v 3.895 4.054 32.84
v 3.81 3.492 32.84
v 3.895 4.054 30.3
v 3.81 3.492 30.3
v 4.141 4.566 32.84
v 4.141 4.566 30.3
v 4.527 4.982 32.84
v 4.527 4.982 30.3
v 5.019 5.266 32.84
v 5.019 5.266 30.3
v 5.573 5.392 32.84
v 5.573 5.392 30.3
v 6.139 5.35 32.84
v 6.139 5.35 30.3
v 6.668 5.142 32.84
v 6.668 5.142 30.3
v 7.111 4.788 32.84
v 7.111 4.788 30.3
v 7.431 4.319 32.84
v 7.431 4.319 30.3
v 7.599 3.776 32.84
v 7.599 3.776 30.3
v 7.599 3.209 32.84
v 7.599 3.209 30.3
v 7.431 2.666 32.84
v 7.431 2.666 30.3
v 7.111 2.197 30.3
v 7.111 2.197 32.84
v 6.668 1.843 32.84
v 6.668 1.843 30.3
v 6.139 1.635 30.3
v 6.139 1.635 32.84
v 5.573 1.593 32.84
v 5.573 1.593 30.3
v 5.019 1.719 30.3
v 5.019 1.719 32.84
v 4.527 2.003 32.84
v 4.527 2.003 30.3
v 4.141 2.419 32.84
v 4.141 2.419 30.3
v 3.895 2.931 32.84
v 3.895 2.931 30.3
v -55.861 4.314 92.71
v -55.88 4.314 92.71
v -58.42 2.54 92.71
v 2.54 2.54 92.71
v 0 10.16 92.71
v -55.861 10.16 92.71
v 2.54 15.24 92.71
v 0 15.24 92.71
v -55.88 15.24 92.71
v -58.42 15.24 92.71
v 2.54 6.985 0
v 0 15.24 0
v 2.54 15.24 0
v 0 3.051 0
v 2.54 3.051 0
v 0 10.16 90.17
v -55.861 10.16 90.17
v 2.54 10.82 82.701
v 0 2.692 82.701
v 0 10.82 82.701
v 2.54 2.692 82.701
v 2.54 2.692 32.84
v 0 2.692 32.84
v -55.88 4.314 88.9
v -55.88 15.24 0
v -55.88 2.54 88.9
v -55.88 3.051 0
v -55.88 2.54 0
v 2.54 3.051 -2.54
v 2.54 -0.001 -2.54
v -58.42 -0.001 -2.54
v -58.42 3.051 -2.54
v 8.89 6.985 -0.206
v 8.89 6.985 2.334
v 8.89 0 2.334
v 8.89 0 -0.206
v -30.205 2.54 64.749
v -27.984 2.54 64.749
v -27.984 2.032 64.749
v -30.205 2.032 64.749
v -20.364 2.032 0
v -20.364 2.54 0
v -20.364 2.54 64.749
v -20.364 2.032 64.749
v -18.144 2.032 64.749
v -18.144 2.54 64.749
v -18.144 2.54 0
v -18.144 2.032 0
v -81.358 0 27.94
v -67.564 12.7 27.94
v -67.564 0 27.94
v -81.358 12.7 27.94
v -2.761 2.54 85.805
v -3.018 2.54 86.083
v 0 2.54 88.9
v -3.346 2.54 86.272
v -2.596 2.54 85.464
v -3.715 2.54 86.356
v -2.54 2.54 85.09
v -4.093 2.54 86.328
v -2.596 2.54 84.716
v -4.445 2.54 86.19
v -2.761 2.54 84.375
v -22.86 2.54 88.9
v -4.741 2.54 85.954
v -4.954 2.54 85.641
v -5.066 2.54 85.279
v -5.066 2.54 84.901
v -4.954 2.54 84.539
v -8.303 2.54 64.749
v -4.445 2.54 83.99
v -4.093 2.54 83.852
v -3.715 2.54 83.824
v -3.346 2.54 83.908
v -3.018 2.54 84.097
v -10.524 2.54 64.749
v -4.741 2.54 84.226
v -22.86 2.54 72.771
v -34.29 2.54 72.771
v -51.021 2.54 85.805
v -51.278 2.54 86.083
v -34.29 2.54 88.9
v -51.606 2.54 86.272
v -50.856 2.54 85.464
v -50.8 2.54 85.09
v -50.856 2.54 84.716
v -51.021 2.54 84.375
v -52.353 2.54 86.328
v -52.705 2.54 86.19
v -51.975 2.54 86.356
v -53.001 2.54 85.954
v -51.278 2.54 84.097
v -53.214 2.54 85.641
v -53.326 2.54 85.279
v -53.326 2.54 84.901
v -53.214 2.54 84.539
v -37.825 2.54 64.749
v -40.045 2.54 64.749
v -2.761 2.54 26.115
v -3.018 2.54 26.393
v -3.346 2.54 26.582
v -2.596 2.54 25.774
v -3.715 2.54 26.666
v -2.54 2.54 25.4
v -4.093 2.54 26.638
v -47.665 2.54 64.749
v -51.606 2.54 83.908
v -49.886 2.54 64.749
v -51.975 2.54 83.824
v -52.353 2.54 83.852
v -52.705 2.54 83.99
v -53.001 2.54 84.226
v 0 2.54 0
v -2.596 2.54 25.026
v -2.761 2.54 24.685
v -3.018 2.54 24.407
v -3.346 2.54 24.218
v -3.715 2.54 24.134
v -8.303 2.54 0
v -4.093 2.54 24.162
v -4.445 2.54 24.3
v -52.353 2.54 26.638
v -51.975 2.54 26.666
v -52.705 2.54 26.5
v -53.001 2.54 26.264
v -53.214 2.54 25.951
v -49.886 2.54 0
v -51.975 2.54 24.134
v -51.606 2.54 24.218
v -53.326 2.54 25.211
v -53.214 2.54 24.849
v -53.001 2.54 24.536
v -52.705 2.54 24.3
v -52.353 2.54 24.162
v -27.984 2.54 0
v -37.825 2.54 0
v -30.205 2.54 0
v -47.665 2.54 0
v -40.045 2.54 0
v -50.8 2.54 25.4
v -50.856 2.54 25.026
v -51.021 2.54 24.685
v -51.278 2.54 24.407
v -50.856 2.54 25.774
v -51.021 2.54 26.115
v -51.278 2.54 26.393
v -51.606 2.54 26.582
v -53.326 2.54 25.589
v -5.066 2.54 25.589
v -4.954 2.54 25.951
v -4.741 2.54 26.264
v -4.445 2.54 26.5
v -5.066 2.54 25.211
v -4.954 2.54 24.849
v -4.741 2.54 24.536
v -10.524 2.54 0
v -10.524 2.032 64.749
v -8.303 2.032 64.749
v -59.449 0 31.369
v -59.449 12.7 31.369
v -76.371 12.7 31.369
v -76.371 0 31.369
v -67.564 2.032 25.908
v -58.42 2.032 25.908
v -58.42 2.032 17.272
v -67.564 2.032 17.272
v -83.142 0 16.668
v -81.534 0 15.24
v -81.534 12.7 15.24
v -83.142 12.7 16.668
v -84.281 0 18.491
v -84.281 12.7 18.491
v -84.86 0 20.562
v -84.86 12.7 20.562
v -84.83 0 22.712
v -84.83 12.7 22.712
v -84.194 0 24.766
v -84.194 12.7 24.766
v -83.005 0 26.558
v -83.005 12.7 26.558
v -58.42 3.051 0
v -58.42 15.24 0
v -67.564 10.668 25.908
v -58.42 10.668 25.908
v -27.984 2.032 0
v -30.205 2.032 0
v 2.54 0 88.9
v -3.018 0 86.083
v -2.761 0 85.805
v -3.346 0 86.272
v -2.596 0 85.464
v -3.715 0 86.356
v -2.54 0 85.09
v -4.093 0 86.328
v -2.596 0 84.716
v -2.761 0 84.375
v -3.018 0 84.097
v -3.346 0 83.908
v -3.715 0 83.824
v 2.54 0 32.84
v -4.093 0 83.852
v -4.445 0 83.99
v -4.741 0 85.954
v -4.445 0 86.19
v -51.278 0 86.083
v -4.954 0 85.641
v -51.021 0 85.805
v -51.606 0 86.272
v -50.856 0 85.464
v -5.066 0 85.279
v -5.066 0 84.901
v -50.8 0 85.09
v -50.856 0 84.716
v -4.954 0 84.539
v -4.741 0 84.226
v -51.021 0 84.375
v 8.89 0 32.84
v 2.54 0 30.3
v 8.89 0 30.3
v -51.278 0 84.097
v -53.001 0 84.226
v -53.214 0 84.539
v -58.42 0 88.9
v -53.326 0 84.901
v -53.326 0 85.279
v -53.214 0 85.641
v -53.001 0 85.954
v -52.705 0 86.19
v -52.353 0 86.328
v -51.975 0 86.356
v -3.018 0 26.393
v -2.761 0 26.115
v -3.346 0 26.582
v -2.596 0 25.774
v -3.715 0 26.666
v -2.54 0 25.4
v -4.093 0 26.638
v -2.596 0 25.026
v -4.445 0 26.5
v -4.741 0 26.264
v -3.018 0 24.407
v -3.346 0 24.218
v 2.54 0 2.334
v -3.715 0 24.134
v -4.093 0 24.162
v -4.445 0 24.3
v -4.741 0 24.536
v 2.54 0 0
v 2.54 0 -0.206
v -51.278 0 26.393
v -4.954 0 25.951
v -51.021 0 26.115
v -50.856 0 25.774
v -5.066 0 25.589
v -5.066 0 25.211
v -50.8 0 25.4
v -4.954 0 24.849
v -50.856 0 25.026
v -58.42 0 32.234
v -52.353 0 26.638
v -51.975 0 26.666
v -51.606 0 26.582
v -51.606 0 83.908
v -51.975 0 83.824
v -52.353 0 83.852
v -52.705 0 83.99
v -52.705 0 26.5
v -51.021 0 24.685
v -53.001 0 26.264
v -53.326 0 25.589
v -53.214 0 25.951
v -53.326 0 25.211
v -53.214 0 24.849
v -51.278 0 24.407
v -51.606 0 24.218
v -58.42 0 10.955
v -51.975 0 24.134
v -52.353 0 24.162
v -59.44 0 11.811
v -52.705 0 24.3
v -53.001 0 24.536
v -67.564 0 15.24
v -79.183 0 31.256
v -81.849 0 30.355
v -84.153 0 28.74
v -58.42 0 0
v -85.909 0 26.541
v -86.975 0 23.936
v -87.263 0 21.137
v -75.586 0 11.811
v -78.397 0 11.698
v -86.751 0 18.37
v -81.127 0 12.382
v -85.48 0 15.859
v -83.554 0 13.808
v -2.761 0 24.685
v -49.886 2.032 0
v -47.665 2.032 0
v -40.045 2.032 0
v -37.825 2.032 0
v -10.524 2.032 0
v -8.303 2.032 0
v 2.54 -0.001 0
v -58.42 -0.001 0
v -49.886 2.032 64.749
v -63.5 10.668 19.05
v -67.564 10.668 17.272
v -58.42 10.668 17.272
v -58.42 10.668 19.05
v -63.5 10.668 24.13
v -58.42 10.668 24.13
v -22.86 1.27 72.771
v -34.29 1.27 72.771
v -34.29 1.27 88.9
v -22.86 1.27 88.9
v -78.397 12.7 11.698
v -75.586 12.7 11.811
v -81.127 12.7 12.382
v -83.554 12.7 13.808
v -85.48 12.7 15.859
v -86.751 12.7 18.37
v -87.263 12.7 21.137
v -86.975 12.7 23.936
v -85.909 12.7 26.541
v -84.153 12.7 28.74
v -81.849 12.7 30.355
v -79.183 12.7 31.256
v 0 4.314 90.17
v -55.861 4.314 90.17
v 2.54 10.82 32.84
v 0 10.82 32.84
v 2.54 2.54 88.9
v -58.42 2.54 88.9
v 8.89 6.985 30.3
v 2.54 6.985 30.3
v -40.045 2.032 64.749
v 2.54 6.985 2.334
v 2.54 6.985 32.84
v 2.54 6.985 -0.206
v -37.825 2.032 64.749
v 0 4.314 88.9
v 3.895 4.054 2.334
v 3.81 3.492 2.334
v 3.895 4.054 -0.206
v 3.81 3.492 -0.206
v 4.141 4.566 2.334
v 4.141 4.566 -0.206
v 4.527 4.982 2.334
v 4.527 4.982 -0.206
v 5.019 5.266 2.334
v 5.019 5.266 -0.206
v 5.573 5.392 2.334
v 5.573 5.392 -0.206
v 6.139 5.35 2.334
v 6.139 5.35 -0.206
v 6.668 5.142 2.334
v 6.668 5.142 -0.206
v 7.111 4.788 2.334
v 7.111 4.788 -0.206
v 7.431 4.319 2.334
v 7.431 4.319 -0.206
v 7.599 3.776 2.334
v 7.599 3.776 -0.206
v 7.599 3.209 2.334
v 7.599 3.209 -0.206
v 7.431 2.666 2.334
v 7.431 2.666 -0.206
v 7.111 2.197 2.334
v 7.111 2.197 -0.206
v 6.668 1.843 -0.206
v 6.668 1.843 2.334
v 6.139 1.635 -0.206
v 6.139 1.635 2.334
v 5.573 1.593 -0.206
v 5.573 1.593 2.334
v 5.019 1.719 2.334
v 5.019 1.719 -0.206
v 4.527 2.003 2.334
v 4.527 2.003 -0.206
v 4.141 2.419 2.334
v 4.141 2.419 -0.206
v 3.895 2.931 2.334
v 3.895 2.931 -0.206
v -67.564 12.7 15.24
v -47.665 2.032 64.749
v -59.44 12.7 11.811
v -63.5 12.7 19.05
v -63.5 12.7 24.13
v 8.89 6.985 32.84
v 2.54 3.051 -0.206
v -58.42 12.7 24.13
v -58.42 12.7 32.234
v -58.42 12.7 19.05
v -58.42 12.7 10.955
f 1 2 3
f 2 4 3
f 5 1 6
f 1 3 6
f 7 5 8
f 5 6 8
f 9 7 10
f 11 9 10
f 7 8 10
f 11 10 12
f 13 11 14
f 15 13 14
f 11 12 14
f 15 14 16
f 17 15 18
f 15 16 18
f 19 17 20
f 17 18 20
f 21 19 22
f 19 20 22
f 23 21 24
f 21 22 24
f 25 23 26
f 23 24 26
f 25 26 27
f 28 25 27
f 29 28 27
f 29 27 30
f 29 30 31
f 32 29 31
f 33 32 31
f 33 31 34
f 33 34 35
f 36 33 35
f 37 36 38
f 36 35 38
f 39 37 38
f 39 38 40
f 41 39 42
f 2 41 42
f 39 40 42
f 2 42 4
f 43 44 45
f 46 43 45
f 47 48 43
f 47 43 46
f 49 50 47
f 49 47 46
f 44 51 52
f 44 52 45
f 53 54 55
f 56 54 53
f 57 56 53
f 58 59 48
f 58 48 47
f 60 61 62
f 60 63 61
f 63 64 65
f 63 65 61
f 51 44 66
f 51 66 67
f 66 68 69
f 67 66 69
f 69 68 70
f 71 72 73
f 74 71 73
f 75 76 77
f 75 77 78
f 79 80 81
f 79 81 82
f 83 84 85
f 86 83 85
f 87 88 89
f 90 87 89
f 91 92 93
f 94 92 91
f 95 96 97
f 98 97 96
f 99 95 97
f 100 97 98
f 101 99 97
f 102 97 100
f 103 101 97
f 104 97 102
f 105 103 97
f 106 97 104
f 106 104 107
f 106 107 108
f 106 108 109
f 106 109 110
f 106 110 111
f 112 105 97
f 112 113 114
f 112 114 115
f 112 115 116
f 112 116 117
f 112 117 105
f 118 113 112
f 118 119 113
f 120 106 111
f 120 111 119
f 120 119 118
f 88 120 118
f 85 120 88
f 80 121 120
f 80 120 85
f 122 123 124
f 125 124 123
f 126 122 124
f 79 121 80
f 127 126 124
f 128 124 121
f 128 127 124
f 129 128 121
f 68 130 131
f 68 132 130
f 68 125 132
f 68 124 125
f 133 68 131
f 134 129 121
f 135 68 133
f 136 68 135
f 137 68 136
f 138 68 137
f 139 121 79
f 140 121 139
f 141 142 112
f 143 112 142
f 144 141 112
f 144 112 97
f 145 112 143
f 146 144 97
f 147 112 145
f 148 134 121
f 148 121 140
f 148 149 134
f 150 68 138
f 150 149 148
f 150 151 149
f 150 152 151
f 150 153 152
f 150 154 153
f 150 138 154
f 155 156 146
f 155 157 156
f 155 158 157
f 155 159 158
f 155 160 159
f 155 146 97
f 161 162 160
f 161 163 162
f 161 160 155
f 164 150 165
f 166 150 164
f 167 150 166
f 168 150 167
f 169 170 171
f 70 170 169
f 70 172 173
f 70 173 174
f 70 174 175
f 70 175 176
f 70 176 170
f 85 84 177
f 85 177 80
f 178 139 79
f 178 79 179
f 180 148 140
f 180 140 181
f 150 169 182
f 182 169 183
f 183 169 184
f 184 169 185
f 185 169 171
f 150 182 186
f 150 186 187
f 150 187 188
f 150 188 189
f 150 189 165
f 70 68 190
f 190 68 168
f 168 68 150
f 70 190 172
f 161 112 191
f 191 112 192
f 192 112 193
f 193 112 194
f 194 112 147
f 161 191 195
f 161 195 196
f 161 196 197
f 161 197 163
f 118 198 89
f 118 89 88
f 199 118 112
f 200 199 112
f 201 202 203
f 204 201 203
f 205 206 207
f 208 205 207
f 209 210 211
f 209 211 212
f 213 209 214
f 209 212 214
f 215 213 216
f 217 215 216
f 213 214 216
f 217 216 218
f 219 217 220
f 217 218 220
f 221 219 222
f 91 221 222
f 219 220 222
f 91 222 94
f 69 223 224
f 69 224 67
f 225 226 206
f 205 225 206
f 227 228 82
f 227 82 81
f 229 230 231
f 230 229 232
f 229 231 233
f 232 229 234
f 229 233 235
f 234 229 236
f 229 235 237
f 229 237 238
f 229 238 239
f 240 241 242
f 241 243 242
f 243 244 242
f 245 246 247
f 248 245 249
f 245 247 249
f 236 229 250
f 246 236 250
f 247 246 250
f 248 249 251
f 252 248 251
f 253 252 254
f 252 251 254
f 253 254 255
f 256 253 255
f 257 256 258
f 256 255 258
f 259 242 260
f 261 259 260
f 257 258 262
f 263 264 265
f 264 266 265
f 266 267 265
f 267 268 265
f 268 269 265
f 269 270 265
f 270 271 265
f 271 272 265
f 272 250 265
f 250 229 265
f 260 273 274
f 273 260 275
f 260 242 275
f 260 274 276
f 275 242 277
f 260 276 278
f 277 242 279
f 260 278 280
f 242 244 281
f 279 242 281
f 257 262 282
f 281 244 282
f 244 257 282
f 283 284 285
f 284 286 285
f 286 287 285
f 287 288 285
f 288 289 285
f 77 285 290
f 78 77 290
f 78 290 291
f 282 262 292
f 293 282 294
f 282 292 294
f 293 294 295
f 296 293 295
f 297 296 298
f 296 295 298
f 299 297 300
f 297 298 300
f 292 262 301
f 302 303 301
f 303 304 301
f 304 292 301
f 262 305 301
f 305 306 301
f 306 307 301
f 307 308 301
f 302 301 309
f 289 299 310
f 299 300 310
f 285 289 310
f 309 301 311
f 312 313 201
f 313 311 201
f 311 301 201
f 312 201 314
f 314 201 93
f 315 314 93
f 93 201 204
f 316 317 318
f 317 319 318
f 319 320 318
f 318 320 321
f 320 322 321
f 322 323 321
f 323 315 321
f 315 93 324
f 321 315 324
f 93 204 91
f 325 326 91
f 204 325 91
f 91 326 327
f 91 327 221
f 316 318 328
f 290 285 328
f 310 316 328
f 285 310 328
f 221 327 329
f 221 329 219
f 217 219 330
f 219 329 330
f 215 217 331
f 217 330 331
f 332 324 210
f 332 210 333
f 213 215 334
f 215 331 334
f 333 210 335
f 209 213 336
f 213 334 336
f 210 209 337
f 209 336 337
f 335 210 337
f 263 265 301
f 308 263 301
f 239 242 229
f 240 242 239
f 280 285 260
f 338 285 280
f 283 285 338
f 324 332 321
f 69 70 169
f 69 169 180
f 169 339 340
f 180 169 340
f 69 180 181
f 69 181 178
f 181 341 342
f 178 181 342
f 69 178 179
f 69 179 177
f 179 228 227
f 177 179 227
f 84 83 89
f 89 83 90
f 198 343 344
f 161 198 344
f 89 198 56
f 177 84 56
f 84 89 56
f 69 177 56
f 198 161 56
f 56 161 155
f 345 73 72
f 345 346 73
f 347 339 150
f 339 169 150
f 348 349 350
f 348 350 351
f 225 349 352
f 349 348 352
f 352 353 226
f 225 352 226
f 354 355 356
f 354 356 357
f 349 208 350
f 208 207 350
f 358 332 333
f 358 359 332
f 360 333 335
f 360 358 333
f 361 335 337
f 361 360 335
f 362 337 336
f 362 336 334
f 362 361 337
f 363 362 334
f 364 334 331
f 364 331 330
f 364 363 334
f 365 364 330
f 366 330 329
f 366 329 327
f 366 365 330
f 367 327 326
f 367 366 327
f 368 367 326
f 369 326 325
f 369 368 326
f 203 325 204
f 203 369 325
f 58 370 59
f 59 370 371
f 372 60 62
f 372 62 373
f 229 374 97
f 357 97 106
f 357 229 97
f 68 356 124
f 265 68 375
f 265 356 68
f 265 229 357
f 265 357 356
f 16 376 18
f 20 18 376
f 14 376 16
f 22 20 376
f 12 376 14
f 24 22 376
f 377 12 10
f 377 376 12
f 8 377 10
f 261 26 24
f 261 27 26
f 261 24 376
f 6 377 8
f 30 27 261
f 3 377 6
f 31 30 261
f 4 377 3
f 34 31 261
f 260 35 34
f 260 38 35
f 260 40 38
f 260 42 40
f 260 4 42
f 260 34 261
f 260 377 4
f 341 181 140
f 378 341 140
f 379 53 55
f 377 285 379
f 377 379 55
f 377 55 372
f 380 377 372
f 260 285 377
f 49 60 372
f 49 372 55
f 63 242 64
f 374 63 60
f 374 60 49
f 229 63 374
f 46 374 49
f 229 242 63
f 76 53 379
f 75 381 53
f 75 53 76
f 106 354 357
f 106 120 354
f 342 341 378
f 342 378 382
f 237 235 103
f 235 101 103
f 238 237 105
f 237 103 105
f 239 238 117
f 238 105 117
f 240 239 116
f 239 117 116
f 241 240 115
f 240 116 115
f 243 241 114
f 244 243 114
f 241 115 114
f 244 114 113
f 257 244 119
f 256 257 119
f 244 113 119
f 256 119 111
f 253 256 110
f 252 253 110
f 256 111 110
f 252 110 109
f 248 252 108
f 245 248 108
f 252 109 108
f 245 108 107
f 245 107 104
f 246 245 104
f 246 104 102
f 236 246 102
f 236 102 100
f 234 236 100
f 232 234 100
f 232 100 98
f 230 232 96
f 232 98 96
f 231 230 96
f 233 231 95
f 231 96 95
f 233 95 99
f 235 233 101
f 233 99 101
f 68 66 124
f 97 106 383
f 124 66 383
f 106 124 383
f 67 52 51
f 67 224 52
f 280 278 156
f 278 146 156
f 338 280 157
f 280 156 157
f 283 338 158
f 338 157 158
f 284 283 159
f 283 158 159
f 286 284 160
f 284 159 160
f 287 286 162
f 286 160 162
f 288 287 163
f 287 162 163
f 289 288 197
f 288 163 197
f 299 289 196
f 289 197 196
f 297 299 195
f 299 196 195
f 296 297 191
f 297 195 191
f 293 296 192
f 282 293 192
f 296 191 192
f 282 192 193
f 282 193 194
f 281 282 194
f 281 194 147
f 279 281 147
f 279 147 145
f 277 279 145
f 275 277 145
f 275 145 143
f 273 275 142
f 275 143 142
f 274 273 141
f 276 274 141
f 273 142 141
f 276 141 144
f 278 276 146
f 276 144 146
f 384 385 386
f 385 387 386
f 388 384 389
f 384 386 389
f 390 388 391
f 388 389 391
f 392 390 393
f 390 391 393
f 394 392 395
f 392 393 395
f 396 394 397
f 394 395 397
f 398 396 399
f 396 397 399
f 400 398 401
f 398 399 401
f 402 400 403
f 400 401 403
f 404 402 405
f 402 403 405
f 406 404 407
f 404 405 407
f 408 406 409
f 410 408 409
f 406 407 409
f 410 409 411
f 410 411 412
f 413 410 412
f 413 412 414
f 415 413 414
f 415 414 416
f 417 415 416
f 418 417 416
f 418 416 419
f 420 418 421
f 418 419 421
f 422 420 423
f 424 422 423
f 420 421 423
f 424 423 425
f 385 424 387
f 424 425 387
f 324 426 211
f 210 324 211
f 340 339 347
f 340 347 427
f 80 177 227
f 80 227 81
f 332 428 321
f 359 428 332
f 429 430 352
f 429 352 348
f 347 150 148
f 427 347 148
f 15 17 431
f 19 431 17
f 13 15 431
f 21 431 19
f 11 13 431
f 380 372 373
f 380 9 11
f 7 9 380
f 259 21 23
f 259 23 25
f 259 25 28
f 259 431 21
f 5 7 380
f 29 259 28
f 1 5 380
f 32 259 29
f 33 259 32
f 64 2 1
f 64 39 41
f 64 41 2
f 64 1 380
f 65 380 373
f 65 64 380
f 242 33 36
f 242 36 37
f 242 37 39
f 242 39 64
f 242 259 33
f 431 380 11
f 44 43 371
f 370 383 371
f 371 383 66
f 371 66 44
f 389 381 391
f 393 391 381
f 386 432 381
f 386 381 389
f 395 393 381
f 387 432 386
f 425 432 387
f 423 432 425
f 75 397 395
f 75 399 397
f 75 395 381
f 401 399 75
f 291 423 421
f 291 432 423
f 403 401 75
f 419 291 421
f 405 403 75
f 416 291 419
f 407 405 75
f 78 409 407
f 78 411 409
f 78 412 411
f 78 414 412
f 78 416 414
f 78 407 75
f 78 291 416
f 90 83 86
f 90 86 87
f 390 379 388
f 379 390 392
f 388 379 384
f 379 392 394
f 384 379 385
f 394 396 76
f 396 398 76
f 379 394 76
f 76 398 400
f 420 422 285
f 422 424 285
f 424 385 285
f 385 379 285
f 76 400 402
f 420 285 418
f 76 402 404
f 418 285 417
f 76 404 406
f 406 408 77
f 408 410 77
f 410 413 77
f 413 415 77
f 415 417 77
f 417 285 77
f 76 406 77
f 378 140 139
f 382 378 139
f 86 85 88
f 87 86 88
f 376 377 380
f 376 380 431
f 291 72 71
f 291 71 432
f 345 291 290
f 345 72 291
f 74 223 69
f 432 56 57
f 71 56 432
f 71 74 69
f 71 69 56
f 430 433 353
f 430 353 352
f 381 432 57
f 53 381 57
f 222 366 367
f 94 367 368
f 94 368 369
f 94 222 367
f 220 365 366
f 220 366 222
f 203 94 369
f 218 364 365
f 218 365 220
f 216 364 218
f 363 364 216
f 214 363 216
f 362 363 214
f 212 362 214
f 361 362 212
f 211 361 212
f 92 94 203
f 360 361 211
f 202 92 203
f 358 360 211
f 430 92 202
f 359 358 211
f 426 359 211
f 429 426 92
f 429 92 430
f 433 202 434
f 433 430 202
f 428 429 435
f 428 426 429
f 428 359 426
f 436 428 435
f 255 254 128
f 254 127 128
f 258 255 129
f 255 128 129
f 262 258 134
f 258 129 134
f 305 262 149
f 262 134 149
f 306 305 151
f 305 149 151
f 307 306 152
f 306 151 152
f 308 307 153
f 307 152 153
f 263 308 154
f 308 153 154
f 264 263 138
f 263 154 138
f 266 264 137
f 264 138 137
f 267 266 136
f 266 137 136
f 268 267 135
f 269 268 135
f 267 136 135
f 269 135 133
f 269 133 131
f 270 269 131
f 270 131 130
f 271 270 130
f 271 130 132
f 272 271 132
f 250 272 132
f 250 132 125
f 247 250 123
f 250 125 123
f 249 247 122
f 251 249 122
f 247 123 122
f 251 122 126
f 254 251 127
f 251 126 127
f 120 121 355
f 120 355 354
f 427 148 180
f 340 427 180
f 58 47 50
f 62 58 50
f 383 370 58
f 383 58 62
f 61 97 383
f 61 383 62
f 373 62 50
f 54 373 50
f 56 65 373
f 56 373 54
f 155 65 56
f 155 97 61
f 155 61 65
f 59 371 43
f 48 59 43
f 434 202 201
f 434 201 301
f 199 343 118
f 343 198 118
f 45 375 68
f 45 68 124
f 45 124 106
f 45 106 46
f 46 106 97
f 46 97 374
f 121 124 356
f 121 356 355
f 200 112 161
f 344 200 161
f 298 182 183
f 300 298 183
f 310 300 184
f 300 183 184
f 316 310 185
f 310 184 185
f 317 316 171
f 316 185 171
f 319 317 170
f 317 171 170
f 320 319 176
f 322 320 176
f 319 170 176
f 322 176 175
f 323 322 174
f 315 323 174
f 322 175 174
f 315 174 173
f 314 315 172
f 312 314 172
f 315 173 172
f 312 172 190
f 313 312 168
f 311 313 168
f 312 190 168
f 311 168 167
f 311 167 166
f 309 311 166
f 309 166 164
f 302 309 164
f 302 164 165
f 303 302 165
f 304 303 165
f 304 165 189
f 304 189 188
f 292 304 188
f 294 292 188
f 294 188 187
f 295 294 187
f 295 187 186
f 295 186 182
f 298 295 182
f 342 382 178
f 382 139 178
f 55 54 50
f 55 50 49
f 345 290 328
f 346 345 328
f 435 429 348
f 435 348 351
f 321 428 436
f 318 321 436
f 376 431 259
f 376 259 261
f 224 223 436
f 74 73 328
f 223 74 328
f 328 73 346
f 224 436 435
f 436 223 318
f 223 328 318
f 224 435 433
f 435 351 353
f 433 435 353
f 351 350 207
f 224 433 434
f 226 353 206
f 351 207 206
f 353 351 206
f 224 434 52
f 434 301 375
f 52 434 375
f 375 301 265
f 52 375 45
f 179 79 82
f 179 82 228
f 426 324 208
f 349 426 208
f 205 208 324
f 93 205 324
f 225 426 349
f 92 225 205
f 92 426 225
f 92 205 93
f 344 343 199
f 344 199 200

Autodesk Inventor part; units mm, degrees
ref_plane "YZ Plane" through (0, 0, 0) normal (1, 0, 0) x (0, 1, 0)
ref_plane "XZ Plane" through (0, 0, 0) normal (0, 1, 0) x (-1, 0, 0)
ref_plane "XY Plane" through (0, 0, 0) normal (0, 0, 1) x (1, 0, 0)
sketch "Sketch1" plane through (0, 0, 0) normal (0, 1, 0) x (-1, 0, 0)
  line L0 (0, 0) -> (55.88, 0)
  line L1 (55.88, 0) -> (55.88, 88.9)
  line L2 (55.88, 88.9) -> (0, 88.9)
  line L3 (0, 88.9) -> (0, 0)
  dimension "d0" = 55.88
  dimension "d1" = 88.9
extrude "Extrusion1" add sketch "Sketch1" along normal blind 2.54
sketch "Sketch2" plane through (0, 2.54, 0) normal (0, 1, 0) x (1, 0, 0)
  line L0 (-55.88, -88.9) -> (0, -88.9) projected
  line L1 (-22.86, -88.9) -> (-34.29, -88.9)
  line L2 (-34.29, -88.9) -> (-34.29, -72.771)
  line L3 (-34.29, -72.771) -> (-22.86, -72.771)
  line L4 (-22.86, -72.771) -> (-22.86, -88.9)
  point P0 (0, 0)
  dimension "d4" = 11.43
  dimension "d5" = 16.129
  dimension "d6" = 21.59
  dimension "d7" = 22.86
extrude "Extrusion2" cut sketch "Sketch2" against normal blind 1.27
sketch "Sketch3" plane through (0, 2.54, 0) normal (0, 1, 0) x (1, 0, 0)
  line L0 (-10.5239, -64.7488) -> (-8.3034, -64.7488)
  line L1 (-8.3034, -64.7488) -> (-8.3034, 0)
  line L2 (-8.3034, 0) -> (-10.5239, 0)
  line L3 (-10.5239, 0) -> (-10.5239, -64.7488)
  line L4 (0, 0) -> (-55.88, 0) projected
  line L5 (-27.9843, -64.7488) -> (-30.2048, -64.7488)
  line L6 (-30.2048, -64.7488) -> (-30.2048, 0)
  line L7 (-30.2048, 0) -> (-27.9843, 0)
  line L8 (-27.9843, 0) -> (-27.9843, -64.7488)
  line L9 (-49.8857, -64.7488) -> (-47.6652, -64.7488)
  line L10 (-47.6652, -64.7488) -> (-47.6652, 0)
  line L11 (-47.6652, 0) -> (-49.8857, 0)
  line L12 (-49.8857, 0) -> (-49.8857, -64.7488)
  line L13 (-40.0452, -64.7488) -> (-37.8248, -64.7488)
  line L14 (-37.8248, -64.7488) -> (-37.8248, 0)
  line L15 (-37.8248, 0) -> (-40.0452, 0)
  line L16 (-40.0452, 0) -> (-40.0452, -64.7488)
  line L17 (-20.3643, -64.7488) -> (-18.1439, -64.7488)
  line L18 (-18.1439, -64.7488) -> (-18.1439, 0)
  line L19 (-18.1439, 0) -> (-20.3643, 0)
  line L20 (-20.3643, 0) -> (-20.3643, -64.7488)
  line L21 (-47.6652, -64.7488) -> (-40.0452, -64.7488)
  line L22 (-34.29, -72.771) -> (-22.86, -72.771) projected
  line L23 (-37.8248, -64.7488) -> (-30.2048, -64.7488)
  line L24 (-27.9843, -64.7488) -> (-20.3643, -64.7488)
  line L25 (-18.1439, -64.7488) -> (-10.5239, -64.7488)
  dimension "d10" = 7.62
extrude "Extrusion3" cut sketch "Sketch3" against normal blind 0.508 contours L3 L2 L1 L0 | L17 L20 L4 L18 | L5 L6 L4 L8 | L13 L16 L4 L14 | L9 L12 L4 L10
sketch "Sketch4" plane through (-55.88, 0, 0) normal (-1, 0, 0) x (0, 0, 1)
  line L0 (88.9, 0) -> (0, 0) projected
  line L1 (88.9, 0) -> (0, 0)
  line L2 (0, 0) -> (0, 2.54)
  line L3 (0, 2.54) -> (88.9, 2.54)
  line L4 (88.9, 2.54) -> (88.9, 0)
extrude "Extrusion4" add sketch "Sketch4" along normal blind 2.54
sketch "Sketch5" plane through (0, 2.54, 0) normal (0, 1, 0) x (1, 0, 0)
  line L0 (0, -88.9) -> (-58.42, -88.9) projected
  line L1 (-49.8857, 0) -> (-58.42, 0) projected
  line L2 (-58.42, -88.9) -> (-55.88, -88.9)
  line L3 (-55.88, -88.9) -> (-55.88, 0)
  line L4 (-55.88, 0) -> (-58.42, 0)
  line L5 (-58.42, 0) -> (-58.42, -88.9)
  point P0 (0, 0)
  dimension "d15" = 2.54
extrude "Extrusion5" add sketch "Sketch5" along normal blind 12.7
sketch "Sketch6" plane through (0, 0, 88.9) normal (1, 0, 0) x (0, 0, -1)
  line L0 (0, 2.54) -> (16.129, 2.54) projected
  line L1 (0, 0) -> (88.9, 0) projected
  line L2 (0, 2.54) -> (88.9, 2.54)
  line L3 (88.9, 2.54) -> (88.9, 0)
  line L4 (88.9, 0) -> (0, 0)
  line L5 (0, 0) -> (0, 2.54)
extrude "Extrusion6" add sketch "Sketch6" along normal blind 2.54
sketch "Sketch7" plane through (0, 2.54, 0) normal (0, 1, 0) x (1, 0, 0)
  line L0 (2.54, 0) -> (2.54, -88.9) projected
  line L1 (2.54, -88.9) -> (0, -88.9)
  line L2 (0, -88.9) -> (0, 0)
  line L3 (0, 0) -> (2.54, 0)
  line L4 (2.54, 0) -> (2.54, -88.9)
extrude "Extrusion7" add sketch "Sketch7" along normal blind 12.7
sketch "Sketch8" plane through (-34.29, 1.27, 88.9) normal (0, 0, 1) x (1, 0, 0)
  line L0 (-24.13, -1.27) -> (-24.13, 13.97) projected
  line L1 (-21.59, 1.27) -> (-21.59, 13.97) projected
  line L2 (-24.13, 13.97) -> (-21.59, 13.97)
  line L3 (-21.59, 13.97) -> (-21.59, 1.27)
  line L4 (-21.59, 1.27) -> (-24.13, 1.27)
  line L5 (-24.13, 1.27) -> (-24.13, 13.97)
  line L6 (-24.13, 1.27) -> (36.83, 1.27)
  line L7 (36.83, 1.27) -> (36.83, 3.0441)
  line L8 (36.83, 3.0441) -> (-24.13, 3.0441)
  line L9 (-24.13, 3.0441) -> (-24.13, 1.27)
  line L10 (36.83, -1.27) -> (36.83, 13.97) projected
  line L11 (34.29, 1.27) -> (36.83, 1.27)
  line L12 (36.83, 1.27) -> (36.83, 13.97)
  line L13 (36.83, 13.97) -> (34.29, 13.97)
  line L14 (34.29, 13.97) -> (34.29, 1.27)
  line L15 (13.9257, 1.27) -> (6.3057, 1.27) projected
  line L16 (11.43, 0) -> (0, 0) projected
  line L17 (11.3074, 1.27) -> (0, 1.27)
  line L18 (0, 1.27) -> (0, 0)
  line L19 (0, 0) -> (11.3074, 0)
  line L20 (11.3074, 0) -> (11.3074, 1.27)
  point P0 (34.29, -1.27)
extrude "Extrusion8" add sketch "Sketch8" along normal blind 3.81 contours L0 L8 L1 L4 | L0 L2 L1 L8 | L1 L8 L14 L6 | L14 L13 L10 L8 | L8 L7 L6 L14
sketch "Sketch9" plane through (0, 2.54, 0) normal (0, 1, 0) x (1, 0, 0)
  line L0 (0, -92.71) -> (-55.88, -92.71) projected
  line L1 (-55.8607, -92.71) -> (0, -92.71)
  line L2 (0, -92.71) -> (0, -90.17)
  line L3 (0, -90.17) -> (-55.8607, -90.17)
  line L4 (-55.8607, -90.17) -> (-55.8607, -92.71)
  point P0 (0, 0)
  point P1 (-58.42, -92.71)
  point P2 (2.54, -92.71)
  dimension "d24" = 2.54
extrude "Extrusion9" add sketch "Sketch9" along normal blind 7.62
sketch "Sketch10" plane through (-20.3643, 2.54, 0) normal (0, 0, -1) x (-1, 0, 0)
  line L0 (-22.9043, 0) -> (-22.9043, 12.7) projected
  line L1 (38.0557, -2.54) -> (38.0557, 12.7) projected
  line L2 (-22.9043, -3.3059) -> (38.0557, -3.3059)
  line L3 (38.0557, -3.3059) -> (38.0557, -0.2509)
  line L4 (38.0557, -0.2509) -> (-22.9043, -0.2509)
  line L5 (-22.9043, -0.2509) -> (-22.9043, -3.3059)
  point P0 (-20.3643, -2.54)
extrude "Extrusion10" add sketch "Sketch10" along normal blind 2.54
sketch "Sketch11" plane through (-49.8857, 2.2891, 0) normal (0, 1, 0) x (1, 0, 0)
  line L0 (52.4257, 2.54) -> (-8.5343, 2.54) projected
  line L1 (-8.5343, 0) -> (52.4257, 0)
  line L2 (52.4257, 0) -> (52.4257, 2.54)
  line L3 (52.4257, 2.54) -> (-8.5343, 2.54)
  line L4 (-8.5343, 2.54) -> (-8.5343, 0)
  point P0 (49.8857, 0)
extrude "Extrusion12" add sketch "Sketch11" along normal blind 0.762
sketch "Sketch13" plane through (2.54, 0, 88.9) normal (1, 0, 0) x (0, 0, -1)
  line L0 (6.1993, 10.8195) -> (74.4262, 10.8195)
  line L1 (74.4262, 10.8195) -> (74.4262, 2.6915)
  line L2 (74.4262, 2.6915) -> (6.1993, 2.6915)
  line L3 (6.1993, 2.6915) -> (6.1993, 10.8195)
  line L4 (0, 2.54) -> (-3.81, 2.54) projected
  line L5 (0, 2.54) -> (0, 4.3141) projected
  point P0 (88.9, 0)
  dimension "d35" = 8.128
  dimension "d37" = 6.1993
extrude "Extrusion13" cut sketch "Sketch13" against normal blind 2.54
sketch "Sketch14" plane through (0, 2.54, 0) normal (0, 1, 0) x (1, 0, 0)
  circle A0 centre (-52.07, -85.09) radius 1.27
  circle A1 centre (-3.81, -85.09) radius 1.27
  circle A2 centre (-3.81, -25.4) radius 1.27
  circle A3 centre (-52.07, -25.4) radius 1.27
  line L0 (-55.88, 0) -> (0, 0) projected
  line L1 (-53.34, -25.4261) -> (-53.34, -22.8861)
  line L2 (-55.88, 0) -> (-55.88, -92.71) projected
  line L3 (-2.54, -85.09) -> (-2.54, -82.3477)
  line L4 (0, 0) -> (0, -92.71) projected
  line L5 (-3.81, -86.36) -> (-2.794, -86.36)
  line L6 (-22.86, -88.9) -> (0, -88.9) projected
  dimension "d40" = 2.54
  dimension "d41" = 25.4
  dimension "d42" = 2.54
  dimension "d43" = 2.54
  dimension "d44" = 2.54
extrude "Extrusion14" cut sketch "Sketch14" against normal blind 10.922
sketch "Sketch19" plane through (2.54, 2.6915, 82.7007) normal (0, 1, 0) x (1, 0, 0)
  line L0 (-2.54, -6.1993) -> (-2.54, 82.7007) projected
  line L1 (0, 68.2269) -> (0, 0) projected
  line L2 (-2.54, 68.7335) -> (0, 68.7335)
  line L3 (0, 68.7335) -> (0, 53.3001)
  line L4 (0, 53.3001) -> (-2.54, 53.3001)
  line L5 (-2.54, 53.3001) -> (-2.54, 68.7335)
extrude "Extrusion19" add sketch "Sketch19" along normal blind 10.16
sketch "Sketch20" plane through (2.54, 0, 88.9) normal (1, 0, 0) x (0, 0, -1)
  line L0 (56.0605, 2.54) -> (58.6005, 2.54)
  line L1 (58.6005, 2.54) -> (58.6005, 0)
  line L2 (58.6005, 0) -> (56.0605, 0)
  line L3 (56.0605, 0) -> (56.0605, 2.54)
  line L4 (88.9, 0) -> (0, 0) projected
  line L5 (89.1059, 2.54) -> (86.5659, 2.54)
  line L6 (86.5659, 2.54) -> (86.5659, 0)
  line L7 (86.5659, 0) -> (89.1059, 0)
  line L8 (89.1059, 0) -> (89.1059, 2.54)
  line L9 (0, 2.54) -> (88.9, 2.54) projected
  point P0 (57.3305, 0)
  dimension "d61" = 2.54
  dimension "d69" = 27.9654
extrude "Extrusion20" add sketch "Sketch20" along normal blind 5.08 contours L0 L1 L2 L3 | L5 L8 L7 L4 L6
sketch "Sketch21" plane through (2.54, 2.54, 32.8395) normal (0, 1, 0) x (1, 0, 0)
  line L0 (0, 2.54) -> (5.08, 2.54) projected
  line L1 (0, 0) -> (5.08, 0)
  line L2 (5.08, 0) -> (5.08, 2.54)
  line L3 (5.08, 2.54) -> (0, 2.54)
  line L4 (0, 2.54) -> (0, 0)
  line L5 (0, 33.0454) -> (5.08, 33.0454) projected
  line L6 (0, 30.5054) -> (5.08, 30.5054)
  line L7 (5.08, 30.5054) -> (5.08, 33.0454)
  line L8 (5.08, 33.0454) -> (0, 33.0454)
  line L9 (0, 33.0454) -> (0, 30.5054)
  point P0 (-2.54, 32.8395)
extrude "Extrusion21" add sketch "Sketch21" along normal blind 2.54
sketch "Sketch23" plane through (-58.42, 0, 0) normal (-1, 0, 0) x (0, 0, 1)
  line L0 (17.272, 10.668) -> (25.908, 10.668)
  line L1 (25.908, 10.668) -> (25.908, 2.032)
  line L2 (25.908, 2.032) -> (17.272, 2.032)
  line L3 (17.272, 2.032) -> (17.272, 10.668)
  line L4 (0, 3.0511) -> (0, 15.24) projected
  line L5 (15.24, 12.7) -> (27.94, 12.7)
  line L6 (27.94, 12.7) -> (27.94, 0)
  line L7 (27.94, 0) -> (15.24, 0)
  line L8 (15.24, 0) -> (15.24, 12.7)
  line L9 (0, 0) -> (88.9, 0) projected
  dimension "d70" = 8.636
  dimension "d71" = 8.636
  dimension "d73" = 2.032
  dimension "d74" = 12.7
  dimension "d75" = 12.7
  dimension "d76" = 2.032
  dimension "d77" = 15.24
extrude "Extrusion23" add sketch "Sketch23" along normal blind 9.144
sketch "Sketch24" plane through (-58.42, 12.7, 27.94) normal (0, 1, 0) x (1, 0, 0)
  arc A0 (-17.1656, 16.129) -> (-17.9509, -3.429) centre (-18.9636, 6.4064) ccw
  arc A1 (-23.114, 12.7) -> (-22.9376, 0) centre (-18.9636, 6.4064) ccw
  line L0 (0, 12.7) -> (-9.144, 12.7) projected
  line L1 (0, -3.429) -> (-17.9509, -3.429)
  line L2 (0, 16.129) -> (-17.1656, 16.129)
  line L3 (0, 12.7) -> (0, 16.129)
  line L4 (0, 0) -> (0, -3.429)
  line L5 (0, 0) -> (0, -3.429)
  line L6 (-9.144, 12.7) -> (-23.114, 12.7)
  line L7 (-9.144, 0) -> (-22.9376, 0)
  line L8 (0, 0) -> (-9.144, 0) projected
  line L9 (-9.144, 0) -> (0, 0)
  line L10 (0, 12.7) -> (-9.144, 12.7) projected
  line L11 (-9.144, 12.7) -> (0, 12.7)
  point P0 (58.42, 27.94)
  point P1 (-9.144, 1.0206)
  dimension "d101" = 3.429
  dimension "d104" = 3.429
  dimension "d105" = 13.97
sketch "Sketch25" plane through (-58.42, 12.7, 27.94) normal (0, 1, 0) x (1, 0, 0)
  line L0 (0, 27.94) -> (0, -64.77) projected
  line L1 (0, 3.81) -> (-5.08, 3.81)
  line L2 (-5.08, 3.81) -> (-5.08, 8.89)
  line L3 (-5.08, 8.89) -> (0, 8.89)
  line L4 (0, 8.89) -> (0, 3.81)
  line L5 (0, 0) -> (-9.144, 0) projected
  line L6 (0, 12.7) -> (-9.144, 12.7) projected
  point P0 (58.42, 27.94)
  point P1 (-18.1573, 0)
  point P2 (-18.1573, 12.7)
  point P3 (-22.9376, 0)
  point P4 (-23.114, 12.7)
  dimension "d84" = 5.08
  dimension "d85" = 5.08
  dimension "d87" = 3.81
extrude "Extrusion25" cut sketch "Sketch25" against normal blind 5.08
ref_plane "Work Plane2" through (-76.5773, 12.7, 21.59) normal (0, 1, 0) x (1, 0, 0)
sketch "Sketch26" plane through (-76.5773, 12.7, 21.59) normal (0, 1, 0) x (1, 0, 0)
  line L0 (18.1573, 6.35) -> (-4.9567, 6.35) projected
  line L1 (13.0512, 6.35) -> (18.1573, 10.6347)
  line L2 (18.1573, 21.59) -> (18.1573, -67.31) projected
  line L3 (18.1573, 10.6347) -> (18.1573, 6.35)
  line L4 (18.1573, 6.35) -> (13.0512, 6.35)
  line L5 (18.1573, -6.35) -> (-4.7803, -6.35) projected
  line L6 (13.0512, -6.35) -> (18.1573, -10.6442)
  point P0 (76.5773, 21.59)
  point P1 (0, 6.35)
  point P2 (0, -6.35)
  dimension "d90" = 4.2942
extrude "Extrusion26" add sketch "Sketch26" against normal blind 12.7
sketch "Sketch27" plane through (-58.42, -0.7659, 0) normal (0, -1, 0) x (1, 0, 0)
  line L0 (60.96, -2.54) -> (0, -2.54) projected
  line L1 (2.54, 0) -> (0, 0) projected
  line L2 (60.96, -2.54) -> (0, -2.54)
  line L3 (0, -2.54) -> (0, 0)
  line L4 (0, 0) -> (60.96, 0)
  line L5 (60.96, 0) -> (60.96, -2.54)
  point P0 (58.42, 0)
extrude "Extrusion27" cut sketch "Sketch27" against normal blind 0.7645
sketch "Sketch28" plane through (2.54, 5.08, 32.8395) normal (0, 1, 0) x (1, 0, 0)
  line L0 (0, 2.54) -> (0, 0) projected
  line L1 (5.08, 0) -> (5.08, 2.54) projected
  line L2 (0, 2.54) -> (5.08, 2.54)
  line L3 (5.08, 2.54) -> (5.08, 0)
  line L4 (5.08, 0) -> (0, 0)
  line L5 (0, 0) -> (0, 2.54)
  line L6 (0, 33.0454) -> (0, 35.3795) projected
  line L7 (0, 30.5054) -> (5.08, 30.5054) projected
  line L8 (0, 33.0454) -> (5.08, 33.0454)
  line L9 (5.08, 33.0454) -> (5.08, 30.5054)
  line L10 (5.08, 30.5054) -> (0, 30.5054)
  line L11 (0, 30.5054) -> (0, 33.0454)
  point P0 (-2.54, 32.8395)
extrude "Extrusion28" add sketch "Sketch28" along normal blind 1.905
sketch "Sketch29" plane through (7.62, 0, 88.9) normal (1, 0, 0) x (0, 0, -1)
  line L0 (56.0605, 2.6915) -> (56.0605, 6.985) projected
  line L1 (58.6005, 0) -> (58.6005, 6.985) projected
  line L2 (56.0605, 6.985) -> (58.6005, 6.985)
  line L3 (58.6005, 6.985) -> (58.6005, 0)
  line L4 (58.6005, 0) -> (56.0605, 0)
  line L5 (56.0605, 0) -> (56.0605, 6.985)
  line L6 (86.5659, 0) -> (86.5659, 6.985) projected
  line L7 (89.1059, 0) -> (89.1059, 6.985) projected
  line L8 (86.5659, 6.985) -> (89.1059, 6.985)
  line L9 (89.1059, 6.985) -> (89.1059, 0)
  line L10 (89.1059, 0) -> (86.5659, 0)
  line L11 (86.5659, 0) -> (86.5659, 6.985)
  point P0 (88.9, 0)
extrude "Extrusion29" add sketch "Sketch29" along normal blind 1.27
sketch "Sketch30" plane through (0, 2.6915, 82.7007) normal (0, 1, 0) x (1, 0, 0)
  line L0 (2.54, 49.8612) -> (2.54, 0) projected
  line L1 (0, 53.3465) -> (2.54, 53.3465)
  line L2 (2.54, 53.3465) -> (2.54, 49.8612)
  line L3 (2.54, 49.8612) -> (0, 49.8612)
  line L4 (0, 49.8612) -> (0, 53.3465)
  point P0 (0, 82.7007)
extrude "Extrusion30" add sketch "Sketch30" along normal blind 10.16
extrude "Extrusion31" add sketch "Sketch24" against normal blind 12.7
sketch "Sketch31" plane through (2.54, 0, -0.2059) normal (0, 0, -1) x (-1, 0, 0)
  circle A0 centre (-3.175, 3.4925) radius 1.905
  line L0 (0, 6.985) -> (-6.35, 6.985) projected
  line L1 (-6.35, 0) -> (-6.35, 6.985) projected
  point P0 (2.54, 0)
  point P1 (-3.175, 6.985)
  point P2 (-6.35, 3.4925)
  dimension "d108" = 3.81
extrude "Extrusion32" cut sketch "Sketch31" against normal blind 35.56
sketch "Sketch33" plane through (2.54, 0, 88.9) normal (1, 0, 0) x (0, 0, -1)
  line L0 (58.6005, 6.985) -> (58.6005, 0) projected
  line L1 (86.5659, 0) -> (86.5659, 6.985) projected
  line L2 (58.6005, 0) -> (86.5659, 0)
  line L3 (58.6005, 0) -> (86.5659, 0) projected
  line L4 (72.5832, 0) -> (72.5832, 6.0913)
  point P0 (88.9, 0)
properties part number "PI_Box_FINAL_COPY"
